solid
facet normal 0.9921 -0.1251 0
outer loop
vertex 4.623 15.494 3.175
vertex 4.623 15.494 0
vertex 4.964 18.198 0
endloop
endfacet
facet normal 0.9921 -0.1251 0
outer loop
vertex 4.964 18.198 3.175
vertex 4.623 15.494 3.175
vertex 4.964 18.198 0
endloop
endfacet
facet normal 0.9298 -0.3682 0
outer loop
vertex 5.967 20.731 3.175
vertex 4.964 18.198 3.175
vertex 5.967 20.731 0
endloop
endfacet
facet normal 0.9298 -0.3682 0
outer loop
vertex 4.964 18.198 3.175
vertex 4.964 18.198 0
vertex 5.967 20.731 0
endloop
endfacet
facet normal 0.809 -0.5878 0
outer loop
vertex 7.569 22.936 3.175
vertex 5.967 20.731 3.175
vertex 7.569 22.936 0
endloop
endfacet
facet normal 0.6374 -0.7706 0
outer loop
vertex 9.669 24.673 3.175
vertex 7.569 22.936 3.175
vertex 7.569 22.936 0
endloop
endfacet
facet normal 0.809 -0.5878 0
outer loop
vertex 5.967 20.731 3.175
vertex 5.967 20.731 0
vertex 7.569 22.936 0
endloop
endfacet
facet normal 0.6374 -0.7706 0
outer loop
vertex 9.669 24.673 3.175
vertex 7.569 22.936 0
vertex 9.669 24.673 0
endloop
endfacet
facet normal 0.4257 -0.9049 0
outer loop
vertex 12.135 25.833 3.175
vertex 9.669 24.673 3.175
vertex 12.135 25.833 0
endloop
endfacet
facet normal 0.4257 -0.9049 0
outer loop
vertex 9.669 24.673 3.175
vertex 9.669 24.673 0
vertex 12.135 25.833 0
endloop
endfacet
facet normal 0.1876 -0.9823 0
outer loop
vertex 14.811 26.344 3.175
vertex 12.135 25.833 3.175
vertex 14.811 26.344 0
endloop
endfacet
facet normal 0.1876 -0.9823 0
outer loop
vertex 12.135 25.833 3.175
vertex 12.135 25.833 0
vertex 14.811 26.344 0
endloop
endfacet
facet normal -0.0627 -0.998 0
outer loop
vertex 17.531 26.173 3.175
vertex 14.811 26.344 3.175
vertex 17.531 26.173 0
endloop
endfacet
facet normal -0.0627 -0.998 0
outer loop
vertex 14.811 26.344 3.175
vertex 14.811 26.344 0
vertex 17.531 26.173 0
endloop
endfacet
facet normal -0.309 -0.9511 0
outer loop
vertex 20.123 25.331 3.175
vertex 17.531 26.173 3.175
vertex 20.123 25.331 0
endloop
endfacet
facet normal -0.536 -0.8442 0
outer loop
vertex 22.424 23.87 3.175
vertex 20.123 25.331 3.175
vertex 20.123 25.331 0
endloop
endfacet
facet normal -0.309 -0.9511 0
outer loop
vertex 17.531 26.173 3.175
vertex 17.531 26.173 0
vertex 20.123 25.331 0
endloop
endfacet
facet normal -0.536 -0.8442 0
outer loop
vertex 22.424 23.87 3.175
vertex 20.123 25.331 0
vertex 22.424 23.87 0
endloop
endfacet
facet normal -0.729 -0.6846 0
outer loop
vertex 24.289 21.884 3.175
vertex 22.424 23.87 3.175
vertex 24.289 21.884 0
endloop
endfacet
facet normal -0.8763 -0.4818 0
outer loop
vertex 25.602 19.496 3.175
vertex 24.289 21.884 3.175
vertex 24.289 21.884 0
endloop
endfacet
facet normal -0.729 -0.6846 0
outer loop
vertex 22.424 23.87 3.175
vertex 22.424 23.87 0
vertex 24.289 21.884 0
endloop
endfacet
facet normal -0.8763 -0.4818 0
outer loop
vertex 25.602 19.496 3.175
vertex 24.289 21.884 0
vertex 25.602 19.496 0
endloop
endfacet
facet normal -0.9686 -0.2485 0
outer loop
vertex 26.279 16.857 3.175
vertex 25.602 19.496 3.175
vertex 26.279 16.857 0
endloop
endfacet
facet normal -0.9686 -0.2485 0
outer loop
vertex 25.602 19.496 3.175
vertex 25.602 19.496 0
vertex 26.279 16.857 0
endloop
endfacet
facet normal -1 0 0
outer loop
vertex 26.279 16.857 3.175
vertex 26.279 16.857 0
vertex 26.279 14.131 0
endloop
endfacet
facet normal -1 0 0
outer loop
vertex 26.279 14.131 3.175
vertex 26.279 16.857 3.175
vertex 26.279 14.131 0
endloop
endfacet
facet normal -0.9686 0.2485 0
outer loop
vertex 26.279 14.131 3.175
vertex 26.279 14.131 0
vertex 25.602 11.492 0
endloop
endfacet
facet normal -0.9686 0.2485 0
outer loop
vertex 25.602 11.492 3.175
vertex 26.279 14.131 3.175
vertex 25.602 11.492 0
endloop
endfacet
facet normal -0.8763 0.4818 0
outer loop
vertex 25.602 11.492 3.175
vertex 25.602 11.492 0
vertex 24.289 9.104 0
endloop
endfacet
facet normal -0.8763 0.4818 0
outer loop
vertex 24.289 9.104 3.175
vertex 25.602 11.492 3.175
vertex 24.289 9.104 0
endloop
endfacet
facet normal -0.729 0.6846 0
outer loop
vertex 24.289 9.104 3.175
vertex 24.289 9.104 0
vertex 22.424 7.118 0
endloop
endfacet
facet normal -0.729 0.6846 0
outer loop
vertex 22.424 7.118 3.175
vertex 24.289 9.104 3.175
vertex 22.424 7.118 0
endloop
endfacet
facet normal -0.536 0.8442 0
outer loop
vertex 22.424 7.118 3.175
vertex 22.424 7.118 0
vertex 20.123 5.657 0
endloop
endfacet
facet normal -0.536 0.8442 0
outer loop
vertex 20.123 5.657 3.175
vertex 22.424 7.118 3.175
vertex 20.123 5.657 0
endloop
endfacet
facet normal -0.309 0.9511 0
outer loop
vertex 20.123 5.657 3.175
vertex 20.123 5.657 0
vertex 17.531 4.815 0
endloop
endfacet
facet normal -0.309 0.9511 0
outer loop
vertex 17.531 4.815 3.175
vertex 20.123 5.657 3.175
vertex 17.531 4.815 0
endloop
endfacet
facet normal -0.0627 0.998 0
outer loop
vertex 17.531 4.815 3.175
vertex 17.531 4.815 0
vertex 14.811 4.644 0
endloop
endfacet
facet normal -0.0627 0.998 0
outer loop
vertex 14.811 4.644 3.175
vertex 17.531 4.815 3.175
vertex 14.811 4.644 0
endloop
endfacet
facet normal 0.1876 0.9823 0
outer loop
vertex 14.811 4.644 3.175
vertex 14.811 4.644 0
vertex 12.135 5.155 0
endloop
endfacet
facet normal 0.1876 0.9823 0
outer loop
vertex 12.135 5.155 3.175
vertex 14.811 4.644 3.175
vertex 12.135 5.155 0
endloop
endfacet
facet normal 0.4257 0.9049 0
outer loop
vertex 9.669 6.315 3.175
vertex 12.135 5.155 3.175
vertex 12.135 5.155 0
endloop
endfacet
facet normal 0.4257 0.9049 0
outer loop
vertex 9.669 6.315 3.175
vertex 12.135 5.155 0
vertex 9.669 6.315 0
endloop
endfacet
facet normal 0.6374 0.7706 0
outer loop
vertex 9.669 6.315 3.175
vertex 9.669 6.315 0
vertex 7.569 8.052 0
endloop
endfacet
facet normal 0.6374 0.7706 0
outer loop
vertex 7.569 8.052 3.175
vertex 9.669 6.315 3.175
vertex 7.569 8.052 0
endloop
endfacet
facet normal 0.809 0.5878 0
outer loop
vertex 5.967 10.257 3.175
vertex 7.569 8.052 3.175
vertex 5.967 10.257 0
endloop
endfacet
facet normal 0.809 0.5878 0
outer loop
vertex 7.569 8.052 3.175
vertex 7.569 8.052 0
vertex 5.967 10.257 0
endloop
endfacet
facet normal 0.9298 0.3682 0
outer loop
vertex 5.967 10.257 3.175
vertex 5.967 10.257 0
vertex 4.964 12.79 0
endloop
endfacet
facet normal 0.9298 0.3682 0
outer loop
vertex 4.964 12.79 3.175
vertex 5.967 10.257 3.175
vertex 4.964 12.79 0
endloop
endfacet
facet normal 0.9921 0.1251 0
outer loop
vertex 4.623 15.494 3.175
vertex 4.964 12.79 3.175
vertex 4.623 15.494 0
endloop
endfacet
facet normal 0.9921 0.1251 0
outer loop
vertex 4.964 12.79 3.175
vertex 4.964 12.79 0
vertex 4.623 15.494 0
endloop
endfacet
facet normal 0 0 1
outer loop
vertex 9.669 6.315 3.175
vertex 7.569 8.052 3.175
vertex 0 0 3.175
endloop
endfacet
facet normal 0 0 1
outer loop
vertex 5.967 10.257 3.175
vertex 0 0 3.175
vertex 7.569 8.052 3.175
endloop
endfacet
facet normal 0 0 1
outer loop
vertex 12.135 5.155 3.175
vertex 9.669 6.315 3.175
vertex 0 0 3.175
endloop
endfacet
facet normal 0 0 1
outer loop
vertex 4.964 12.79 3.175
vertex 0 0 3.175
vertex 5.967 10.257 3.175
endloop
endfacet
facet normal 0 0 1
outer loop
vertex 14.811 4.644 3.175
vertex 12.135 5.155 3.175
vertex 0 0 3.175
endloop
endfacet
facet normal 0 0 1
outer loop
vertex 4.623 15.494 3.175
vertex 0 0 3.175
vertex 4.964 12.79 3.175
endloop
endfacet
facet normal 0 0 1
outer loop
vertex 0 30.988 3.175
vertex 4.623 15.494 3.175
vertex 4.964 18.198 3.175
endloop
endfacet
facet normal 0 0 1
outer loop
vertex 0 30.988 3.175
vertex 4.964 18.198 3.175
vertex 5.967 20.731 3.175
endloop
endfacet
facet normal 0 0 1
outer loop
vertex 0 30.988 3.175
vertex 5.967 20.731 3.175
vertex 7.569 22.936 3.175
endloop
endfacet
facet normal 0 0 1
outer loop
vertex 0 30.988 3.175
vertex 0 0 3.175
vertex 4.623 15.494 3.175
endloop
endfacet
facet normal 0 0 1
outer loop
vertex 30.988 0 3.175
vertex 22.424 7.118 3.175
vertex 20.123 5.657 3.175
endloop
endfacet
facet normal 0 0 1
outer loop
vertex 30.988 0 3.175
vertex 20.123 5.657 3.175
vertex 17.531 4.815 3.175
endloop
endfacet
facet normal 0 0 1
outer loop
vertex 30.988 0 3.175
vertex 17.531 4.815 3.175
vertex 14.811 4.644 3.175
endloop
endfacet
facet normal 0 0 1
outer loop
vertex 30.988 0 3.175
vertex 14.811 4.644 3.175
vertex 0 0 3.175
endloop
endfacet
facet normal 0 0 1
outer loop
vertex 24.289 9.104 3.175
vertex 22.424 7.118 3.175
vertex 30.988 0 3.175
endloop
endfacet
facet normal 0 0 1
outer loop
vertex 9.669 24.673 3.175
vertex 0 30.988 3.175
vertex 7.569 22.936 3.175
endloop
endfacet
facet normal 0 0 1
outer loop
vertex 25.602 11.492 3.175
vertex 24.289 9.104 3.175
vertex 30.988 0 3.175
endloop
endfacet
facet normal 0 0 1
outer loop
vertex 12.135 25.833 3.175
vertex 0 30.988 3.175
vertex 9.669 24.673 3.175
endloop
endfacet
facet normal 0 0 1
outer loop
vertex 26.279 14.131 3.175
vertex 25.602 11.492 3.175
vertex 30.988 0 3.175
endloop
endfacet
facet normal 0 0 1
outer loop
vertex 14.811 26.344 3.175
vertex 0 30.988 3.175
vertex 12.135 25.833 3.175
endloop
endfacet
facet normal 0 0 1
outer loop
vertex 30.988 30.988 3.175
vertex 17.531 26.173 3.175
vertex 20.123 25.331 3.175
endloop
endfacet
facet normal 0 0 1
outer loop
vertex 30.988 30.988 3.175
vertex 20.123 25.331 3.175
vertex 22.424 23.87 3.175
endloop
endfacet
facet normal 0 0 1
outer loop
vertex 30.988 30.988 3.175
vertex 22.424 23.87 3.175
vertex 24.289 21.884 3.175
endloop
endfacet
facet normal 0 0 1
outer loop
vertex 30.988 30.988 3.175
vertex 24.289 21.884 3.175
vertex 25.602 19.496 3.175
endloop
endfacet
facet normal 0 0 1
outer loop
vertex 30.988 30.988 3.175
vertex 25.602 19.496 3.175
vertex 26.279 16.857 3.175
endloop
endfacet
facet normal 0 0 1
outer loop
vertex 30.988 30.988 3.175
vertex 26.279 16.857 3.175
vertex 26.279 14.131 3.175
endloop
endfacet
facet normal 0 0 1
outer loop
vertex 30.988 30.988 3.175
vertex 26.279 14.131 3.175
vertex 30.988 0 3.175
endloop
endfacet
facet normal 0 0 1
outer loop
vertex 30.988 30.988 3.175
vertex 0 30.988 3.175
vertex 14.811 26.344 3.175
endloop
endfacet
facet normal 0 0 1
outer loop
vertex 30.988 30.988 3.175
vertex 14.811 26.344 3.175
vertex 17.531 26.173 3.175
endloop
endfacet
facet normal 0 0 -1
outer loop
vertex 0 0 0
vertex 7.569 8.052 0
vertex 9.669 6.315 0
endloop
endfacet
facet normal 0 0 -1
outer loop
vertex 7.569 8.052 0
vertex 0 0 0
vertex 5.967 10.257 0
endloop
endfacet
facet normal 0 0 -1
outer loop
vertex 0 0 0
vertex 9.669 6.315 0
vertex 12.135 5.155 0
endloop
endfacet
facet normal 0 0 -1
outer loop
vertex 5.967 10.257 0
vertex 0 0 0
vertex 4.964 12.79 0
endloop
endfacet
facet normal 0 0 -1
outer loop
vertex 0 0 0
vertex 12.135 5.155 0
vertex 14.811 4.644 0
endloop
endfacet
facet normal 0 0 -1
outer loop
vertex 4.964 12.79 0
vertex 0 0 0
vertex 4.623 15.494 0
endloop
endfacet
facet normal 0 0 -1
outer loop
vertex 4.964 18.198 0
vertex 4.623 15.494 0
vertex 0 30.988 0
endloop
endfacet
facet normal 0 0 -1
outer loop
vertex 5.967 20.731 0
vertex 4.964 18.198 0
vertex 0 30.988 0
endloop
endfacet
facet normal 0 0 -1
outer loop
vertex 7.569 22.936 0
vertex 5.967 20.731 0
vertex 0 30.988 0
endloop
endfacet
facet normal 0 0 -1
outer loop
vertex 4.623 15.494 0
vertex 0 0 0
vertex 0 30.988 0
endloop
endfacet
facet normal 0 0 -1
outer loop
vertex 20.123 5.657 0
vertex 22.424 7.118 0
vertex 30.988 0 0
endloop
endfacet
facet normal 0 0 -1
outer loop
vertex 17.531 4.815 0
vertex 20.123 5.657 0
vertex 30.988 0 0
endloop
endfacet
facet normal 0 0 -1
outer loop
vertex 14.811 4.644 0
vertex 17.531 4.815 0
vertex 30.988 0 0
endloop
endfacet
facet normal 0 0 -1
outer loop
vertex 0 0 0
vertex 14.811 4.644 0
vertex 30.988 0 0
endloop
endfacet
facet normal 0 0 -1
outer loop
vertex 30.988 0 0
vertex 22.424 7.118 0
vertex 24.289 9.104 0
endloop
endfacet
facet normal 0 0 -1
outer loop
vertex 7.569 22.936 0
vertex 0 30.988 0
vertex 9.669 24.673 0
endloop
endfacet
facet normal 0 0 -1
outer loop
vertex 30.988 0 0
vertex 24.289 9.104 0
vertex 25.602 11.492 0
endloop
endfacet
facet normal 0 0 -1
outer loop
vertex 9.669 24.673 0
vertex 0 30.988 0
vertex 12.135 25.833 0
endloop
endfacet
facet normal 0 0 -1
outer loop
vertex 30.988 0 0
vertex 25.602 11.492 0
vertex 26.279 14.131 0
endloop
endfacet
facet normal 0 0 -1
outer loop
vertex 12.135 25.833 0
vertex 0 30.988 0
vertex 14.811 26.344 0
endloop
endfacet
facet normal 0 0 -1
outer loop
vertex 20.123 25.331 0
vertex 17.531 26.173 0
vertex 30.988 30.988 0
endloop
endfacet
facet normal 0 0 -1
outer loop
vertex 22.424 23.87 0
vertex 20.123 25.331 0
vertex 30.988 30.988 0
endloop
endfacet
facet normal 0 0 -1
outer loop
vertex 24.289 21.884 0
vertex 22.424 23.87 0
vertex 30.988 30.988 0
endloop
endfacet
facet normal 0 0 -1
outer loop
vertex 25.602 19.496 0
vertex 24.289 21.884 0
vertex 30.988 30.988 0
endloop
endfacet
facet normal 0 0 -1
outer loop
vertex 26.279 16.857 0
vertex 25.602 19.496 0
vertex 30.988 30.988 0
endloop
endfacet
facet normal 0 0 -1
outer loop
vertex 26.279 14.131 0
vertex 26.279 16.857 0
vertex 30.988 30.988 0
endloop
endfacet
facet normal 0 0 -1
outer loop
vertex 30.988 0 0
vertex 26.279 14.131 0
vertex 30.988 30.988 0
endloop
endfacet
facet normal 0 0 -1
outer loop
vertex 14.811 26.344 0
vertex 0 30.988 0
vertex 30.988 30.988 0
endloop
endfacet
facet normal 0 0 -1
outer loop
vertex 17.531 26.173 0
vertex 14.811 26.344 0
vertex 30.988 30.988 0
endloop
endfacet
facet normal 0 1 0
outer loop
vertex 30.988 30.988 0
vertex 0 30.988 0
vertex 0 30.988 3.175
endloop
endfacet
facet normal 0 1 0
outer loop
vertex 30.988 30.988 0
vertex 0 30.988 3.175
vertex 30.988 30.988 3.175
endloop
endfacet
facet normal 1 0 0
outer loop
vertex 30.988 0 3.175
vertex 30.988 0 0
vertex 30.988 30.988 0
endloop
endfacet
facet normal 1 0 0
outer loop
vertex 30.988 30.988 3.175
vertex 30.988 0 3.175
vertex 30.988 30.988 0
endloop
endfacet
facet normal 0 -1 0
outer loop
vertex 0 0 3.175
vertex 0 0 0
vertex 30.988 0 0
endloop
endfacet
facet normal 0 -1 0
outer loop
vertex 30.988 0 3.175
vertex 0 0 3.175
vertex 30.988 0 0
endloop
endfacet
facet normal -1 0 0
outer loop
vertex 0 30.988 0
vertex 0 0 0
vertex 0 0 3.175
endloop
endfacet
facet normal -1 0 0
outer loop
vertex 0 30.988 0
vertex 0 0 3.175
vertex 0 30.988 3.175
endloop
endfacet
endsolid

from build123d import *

# Parameters (mm, degrees)
SKETCH1_W           = 30.988
SKETCH1_H           = 30.988
SKETCH1_R           = 5.7277
BOSS_EXTRUDE1_DEPTH = 3.175
SKETCH2_R           = 10.8712
CUT_EXTRUDE2_DEPTH  = 3.2512


with BuildPart() as part:
    # Sketch1 → Boss-Extrude1 (new body)
    with BuildSketch(Plane.XY):
        with Locations((15.494, 15.494)):
            Rectangle(SKETCH1_W, SKETCH1_H)
        with Locations((15.494, 15.494)):
            Circle(SKETCH1_R, mode=Mode.SUBTRACT)
    extrude(amount=BOSS_EXTRUDE1_DEPTH)

    # Sketch2 → Cut-Extrude2 (cut)
    with BuildSketch(Plane(origin=(0, 0, 0), x_dir=(-1, 0, 0), z_dir=(0, 0, -1))):
        with Locations((-15.494, 15.494)):
            Circle(SKETCH2_R)
    extrude(amount=-CUT_EXTRUDE2_DEPTH, mode=Mode.SUBTRACT)


solid = part.part
